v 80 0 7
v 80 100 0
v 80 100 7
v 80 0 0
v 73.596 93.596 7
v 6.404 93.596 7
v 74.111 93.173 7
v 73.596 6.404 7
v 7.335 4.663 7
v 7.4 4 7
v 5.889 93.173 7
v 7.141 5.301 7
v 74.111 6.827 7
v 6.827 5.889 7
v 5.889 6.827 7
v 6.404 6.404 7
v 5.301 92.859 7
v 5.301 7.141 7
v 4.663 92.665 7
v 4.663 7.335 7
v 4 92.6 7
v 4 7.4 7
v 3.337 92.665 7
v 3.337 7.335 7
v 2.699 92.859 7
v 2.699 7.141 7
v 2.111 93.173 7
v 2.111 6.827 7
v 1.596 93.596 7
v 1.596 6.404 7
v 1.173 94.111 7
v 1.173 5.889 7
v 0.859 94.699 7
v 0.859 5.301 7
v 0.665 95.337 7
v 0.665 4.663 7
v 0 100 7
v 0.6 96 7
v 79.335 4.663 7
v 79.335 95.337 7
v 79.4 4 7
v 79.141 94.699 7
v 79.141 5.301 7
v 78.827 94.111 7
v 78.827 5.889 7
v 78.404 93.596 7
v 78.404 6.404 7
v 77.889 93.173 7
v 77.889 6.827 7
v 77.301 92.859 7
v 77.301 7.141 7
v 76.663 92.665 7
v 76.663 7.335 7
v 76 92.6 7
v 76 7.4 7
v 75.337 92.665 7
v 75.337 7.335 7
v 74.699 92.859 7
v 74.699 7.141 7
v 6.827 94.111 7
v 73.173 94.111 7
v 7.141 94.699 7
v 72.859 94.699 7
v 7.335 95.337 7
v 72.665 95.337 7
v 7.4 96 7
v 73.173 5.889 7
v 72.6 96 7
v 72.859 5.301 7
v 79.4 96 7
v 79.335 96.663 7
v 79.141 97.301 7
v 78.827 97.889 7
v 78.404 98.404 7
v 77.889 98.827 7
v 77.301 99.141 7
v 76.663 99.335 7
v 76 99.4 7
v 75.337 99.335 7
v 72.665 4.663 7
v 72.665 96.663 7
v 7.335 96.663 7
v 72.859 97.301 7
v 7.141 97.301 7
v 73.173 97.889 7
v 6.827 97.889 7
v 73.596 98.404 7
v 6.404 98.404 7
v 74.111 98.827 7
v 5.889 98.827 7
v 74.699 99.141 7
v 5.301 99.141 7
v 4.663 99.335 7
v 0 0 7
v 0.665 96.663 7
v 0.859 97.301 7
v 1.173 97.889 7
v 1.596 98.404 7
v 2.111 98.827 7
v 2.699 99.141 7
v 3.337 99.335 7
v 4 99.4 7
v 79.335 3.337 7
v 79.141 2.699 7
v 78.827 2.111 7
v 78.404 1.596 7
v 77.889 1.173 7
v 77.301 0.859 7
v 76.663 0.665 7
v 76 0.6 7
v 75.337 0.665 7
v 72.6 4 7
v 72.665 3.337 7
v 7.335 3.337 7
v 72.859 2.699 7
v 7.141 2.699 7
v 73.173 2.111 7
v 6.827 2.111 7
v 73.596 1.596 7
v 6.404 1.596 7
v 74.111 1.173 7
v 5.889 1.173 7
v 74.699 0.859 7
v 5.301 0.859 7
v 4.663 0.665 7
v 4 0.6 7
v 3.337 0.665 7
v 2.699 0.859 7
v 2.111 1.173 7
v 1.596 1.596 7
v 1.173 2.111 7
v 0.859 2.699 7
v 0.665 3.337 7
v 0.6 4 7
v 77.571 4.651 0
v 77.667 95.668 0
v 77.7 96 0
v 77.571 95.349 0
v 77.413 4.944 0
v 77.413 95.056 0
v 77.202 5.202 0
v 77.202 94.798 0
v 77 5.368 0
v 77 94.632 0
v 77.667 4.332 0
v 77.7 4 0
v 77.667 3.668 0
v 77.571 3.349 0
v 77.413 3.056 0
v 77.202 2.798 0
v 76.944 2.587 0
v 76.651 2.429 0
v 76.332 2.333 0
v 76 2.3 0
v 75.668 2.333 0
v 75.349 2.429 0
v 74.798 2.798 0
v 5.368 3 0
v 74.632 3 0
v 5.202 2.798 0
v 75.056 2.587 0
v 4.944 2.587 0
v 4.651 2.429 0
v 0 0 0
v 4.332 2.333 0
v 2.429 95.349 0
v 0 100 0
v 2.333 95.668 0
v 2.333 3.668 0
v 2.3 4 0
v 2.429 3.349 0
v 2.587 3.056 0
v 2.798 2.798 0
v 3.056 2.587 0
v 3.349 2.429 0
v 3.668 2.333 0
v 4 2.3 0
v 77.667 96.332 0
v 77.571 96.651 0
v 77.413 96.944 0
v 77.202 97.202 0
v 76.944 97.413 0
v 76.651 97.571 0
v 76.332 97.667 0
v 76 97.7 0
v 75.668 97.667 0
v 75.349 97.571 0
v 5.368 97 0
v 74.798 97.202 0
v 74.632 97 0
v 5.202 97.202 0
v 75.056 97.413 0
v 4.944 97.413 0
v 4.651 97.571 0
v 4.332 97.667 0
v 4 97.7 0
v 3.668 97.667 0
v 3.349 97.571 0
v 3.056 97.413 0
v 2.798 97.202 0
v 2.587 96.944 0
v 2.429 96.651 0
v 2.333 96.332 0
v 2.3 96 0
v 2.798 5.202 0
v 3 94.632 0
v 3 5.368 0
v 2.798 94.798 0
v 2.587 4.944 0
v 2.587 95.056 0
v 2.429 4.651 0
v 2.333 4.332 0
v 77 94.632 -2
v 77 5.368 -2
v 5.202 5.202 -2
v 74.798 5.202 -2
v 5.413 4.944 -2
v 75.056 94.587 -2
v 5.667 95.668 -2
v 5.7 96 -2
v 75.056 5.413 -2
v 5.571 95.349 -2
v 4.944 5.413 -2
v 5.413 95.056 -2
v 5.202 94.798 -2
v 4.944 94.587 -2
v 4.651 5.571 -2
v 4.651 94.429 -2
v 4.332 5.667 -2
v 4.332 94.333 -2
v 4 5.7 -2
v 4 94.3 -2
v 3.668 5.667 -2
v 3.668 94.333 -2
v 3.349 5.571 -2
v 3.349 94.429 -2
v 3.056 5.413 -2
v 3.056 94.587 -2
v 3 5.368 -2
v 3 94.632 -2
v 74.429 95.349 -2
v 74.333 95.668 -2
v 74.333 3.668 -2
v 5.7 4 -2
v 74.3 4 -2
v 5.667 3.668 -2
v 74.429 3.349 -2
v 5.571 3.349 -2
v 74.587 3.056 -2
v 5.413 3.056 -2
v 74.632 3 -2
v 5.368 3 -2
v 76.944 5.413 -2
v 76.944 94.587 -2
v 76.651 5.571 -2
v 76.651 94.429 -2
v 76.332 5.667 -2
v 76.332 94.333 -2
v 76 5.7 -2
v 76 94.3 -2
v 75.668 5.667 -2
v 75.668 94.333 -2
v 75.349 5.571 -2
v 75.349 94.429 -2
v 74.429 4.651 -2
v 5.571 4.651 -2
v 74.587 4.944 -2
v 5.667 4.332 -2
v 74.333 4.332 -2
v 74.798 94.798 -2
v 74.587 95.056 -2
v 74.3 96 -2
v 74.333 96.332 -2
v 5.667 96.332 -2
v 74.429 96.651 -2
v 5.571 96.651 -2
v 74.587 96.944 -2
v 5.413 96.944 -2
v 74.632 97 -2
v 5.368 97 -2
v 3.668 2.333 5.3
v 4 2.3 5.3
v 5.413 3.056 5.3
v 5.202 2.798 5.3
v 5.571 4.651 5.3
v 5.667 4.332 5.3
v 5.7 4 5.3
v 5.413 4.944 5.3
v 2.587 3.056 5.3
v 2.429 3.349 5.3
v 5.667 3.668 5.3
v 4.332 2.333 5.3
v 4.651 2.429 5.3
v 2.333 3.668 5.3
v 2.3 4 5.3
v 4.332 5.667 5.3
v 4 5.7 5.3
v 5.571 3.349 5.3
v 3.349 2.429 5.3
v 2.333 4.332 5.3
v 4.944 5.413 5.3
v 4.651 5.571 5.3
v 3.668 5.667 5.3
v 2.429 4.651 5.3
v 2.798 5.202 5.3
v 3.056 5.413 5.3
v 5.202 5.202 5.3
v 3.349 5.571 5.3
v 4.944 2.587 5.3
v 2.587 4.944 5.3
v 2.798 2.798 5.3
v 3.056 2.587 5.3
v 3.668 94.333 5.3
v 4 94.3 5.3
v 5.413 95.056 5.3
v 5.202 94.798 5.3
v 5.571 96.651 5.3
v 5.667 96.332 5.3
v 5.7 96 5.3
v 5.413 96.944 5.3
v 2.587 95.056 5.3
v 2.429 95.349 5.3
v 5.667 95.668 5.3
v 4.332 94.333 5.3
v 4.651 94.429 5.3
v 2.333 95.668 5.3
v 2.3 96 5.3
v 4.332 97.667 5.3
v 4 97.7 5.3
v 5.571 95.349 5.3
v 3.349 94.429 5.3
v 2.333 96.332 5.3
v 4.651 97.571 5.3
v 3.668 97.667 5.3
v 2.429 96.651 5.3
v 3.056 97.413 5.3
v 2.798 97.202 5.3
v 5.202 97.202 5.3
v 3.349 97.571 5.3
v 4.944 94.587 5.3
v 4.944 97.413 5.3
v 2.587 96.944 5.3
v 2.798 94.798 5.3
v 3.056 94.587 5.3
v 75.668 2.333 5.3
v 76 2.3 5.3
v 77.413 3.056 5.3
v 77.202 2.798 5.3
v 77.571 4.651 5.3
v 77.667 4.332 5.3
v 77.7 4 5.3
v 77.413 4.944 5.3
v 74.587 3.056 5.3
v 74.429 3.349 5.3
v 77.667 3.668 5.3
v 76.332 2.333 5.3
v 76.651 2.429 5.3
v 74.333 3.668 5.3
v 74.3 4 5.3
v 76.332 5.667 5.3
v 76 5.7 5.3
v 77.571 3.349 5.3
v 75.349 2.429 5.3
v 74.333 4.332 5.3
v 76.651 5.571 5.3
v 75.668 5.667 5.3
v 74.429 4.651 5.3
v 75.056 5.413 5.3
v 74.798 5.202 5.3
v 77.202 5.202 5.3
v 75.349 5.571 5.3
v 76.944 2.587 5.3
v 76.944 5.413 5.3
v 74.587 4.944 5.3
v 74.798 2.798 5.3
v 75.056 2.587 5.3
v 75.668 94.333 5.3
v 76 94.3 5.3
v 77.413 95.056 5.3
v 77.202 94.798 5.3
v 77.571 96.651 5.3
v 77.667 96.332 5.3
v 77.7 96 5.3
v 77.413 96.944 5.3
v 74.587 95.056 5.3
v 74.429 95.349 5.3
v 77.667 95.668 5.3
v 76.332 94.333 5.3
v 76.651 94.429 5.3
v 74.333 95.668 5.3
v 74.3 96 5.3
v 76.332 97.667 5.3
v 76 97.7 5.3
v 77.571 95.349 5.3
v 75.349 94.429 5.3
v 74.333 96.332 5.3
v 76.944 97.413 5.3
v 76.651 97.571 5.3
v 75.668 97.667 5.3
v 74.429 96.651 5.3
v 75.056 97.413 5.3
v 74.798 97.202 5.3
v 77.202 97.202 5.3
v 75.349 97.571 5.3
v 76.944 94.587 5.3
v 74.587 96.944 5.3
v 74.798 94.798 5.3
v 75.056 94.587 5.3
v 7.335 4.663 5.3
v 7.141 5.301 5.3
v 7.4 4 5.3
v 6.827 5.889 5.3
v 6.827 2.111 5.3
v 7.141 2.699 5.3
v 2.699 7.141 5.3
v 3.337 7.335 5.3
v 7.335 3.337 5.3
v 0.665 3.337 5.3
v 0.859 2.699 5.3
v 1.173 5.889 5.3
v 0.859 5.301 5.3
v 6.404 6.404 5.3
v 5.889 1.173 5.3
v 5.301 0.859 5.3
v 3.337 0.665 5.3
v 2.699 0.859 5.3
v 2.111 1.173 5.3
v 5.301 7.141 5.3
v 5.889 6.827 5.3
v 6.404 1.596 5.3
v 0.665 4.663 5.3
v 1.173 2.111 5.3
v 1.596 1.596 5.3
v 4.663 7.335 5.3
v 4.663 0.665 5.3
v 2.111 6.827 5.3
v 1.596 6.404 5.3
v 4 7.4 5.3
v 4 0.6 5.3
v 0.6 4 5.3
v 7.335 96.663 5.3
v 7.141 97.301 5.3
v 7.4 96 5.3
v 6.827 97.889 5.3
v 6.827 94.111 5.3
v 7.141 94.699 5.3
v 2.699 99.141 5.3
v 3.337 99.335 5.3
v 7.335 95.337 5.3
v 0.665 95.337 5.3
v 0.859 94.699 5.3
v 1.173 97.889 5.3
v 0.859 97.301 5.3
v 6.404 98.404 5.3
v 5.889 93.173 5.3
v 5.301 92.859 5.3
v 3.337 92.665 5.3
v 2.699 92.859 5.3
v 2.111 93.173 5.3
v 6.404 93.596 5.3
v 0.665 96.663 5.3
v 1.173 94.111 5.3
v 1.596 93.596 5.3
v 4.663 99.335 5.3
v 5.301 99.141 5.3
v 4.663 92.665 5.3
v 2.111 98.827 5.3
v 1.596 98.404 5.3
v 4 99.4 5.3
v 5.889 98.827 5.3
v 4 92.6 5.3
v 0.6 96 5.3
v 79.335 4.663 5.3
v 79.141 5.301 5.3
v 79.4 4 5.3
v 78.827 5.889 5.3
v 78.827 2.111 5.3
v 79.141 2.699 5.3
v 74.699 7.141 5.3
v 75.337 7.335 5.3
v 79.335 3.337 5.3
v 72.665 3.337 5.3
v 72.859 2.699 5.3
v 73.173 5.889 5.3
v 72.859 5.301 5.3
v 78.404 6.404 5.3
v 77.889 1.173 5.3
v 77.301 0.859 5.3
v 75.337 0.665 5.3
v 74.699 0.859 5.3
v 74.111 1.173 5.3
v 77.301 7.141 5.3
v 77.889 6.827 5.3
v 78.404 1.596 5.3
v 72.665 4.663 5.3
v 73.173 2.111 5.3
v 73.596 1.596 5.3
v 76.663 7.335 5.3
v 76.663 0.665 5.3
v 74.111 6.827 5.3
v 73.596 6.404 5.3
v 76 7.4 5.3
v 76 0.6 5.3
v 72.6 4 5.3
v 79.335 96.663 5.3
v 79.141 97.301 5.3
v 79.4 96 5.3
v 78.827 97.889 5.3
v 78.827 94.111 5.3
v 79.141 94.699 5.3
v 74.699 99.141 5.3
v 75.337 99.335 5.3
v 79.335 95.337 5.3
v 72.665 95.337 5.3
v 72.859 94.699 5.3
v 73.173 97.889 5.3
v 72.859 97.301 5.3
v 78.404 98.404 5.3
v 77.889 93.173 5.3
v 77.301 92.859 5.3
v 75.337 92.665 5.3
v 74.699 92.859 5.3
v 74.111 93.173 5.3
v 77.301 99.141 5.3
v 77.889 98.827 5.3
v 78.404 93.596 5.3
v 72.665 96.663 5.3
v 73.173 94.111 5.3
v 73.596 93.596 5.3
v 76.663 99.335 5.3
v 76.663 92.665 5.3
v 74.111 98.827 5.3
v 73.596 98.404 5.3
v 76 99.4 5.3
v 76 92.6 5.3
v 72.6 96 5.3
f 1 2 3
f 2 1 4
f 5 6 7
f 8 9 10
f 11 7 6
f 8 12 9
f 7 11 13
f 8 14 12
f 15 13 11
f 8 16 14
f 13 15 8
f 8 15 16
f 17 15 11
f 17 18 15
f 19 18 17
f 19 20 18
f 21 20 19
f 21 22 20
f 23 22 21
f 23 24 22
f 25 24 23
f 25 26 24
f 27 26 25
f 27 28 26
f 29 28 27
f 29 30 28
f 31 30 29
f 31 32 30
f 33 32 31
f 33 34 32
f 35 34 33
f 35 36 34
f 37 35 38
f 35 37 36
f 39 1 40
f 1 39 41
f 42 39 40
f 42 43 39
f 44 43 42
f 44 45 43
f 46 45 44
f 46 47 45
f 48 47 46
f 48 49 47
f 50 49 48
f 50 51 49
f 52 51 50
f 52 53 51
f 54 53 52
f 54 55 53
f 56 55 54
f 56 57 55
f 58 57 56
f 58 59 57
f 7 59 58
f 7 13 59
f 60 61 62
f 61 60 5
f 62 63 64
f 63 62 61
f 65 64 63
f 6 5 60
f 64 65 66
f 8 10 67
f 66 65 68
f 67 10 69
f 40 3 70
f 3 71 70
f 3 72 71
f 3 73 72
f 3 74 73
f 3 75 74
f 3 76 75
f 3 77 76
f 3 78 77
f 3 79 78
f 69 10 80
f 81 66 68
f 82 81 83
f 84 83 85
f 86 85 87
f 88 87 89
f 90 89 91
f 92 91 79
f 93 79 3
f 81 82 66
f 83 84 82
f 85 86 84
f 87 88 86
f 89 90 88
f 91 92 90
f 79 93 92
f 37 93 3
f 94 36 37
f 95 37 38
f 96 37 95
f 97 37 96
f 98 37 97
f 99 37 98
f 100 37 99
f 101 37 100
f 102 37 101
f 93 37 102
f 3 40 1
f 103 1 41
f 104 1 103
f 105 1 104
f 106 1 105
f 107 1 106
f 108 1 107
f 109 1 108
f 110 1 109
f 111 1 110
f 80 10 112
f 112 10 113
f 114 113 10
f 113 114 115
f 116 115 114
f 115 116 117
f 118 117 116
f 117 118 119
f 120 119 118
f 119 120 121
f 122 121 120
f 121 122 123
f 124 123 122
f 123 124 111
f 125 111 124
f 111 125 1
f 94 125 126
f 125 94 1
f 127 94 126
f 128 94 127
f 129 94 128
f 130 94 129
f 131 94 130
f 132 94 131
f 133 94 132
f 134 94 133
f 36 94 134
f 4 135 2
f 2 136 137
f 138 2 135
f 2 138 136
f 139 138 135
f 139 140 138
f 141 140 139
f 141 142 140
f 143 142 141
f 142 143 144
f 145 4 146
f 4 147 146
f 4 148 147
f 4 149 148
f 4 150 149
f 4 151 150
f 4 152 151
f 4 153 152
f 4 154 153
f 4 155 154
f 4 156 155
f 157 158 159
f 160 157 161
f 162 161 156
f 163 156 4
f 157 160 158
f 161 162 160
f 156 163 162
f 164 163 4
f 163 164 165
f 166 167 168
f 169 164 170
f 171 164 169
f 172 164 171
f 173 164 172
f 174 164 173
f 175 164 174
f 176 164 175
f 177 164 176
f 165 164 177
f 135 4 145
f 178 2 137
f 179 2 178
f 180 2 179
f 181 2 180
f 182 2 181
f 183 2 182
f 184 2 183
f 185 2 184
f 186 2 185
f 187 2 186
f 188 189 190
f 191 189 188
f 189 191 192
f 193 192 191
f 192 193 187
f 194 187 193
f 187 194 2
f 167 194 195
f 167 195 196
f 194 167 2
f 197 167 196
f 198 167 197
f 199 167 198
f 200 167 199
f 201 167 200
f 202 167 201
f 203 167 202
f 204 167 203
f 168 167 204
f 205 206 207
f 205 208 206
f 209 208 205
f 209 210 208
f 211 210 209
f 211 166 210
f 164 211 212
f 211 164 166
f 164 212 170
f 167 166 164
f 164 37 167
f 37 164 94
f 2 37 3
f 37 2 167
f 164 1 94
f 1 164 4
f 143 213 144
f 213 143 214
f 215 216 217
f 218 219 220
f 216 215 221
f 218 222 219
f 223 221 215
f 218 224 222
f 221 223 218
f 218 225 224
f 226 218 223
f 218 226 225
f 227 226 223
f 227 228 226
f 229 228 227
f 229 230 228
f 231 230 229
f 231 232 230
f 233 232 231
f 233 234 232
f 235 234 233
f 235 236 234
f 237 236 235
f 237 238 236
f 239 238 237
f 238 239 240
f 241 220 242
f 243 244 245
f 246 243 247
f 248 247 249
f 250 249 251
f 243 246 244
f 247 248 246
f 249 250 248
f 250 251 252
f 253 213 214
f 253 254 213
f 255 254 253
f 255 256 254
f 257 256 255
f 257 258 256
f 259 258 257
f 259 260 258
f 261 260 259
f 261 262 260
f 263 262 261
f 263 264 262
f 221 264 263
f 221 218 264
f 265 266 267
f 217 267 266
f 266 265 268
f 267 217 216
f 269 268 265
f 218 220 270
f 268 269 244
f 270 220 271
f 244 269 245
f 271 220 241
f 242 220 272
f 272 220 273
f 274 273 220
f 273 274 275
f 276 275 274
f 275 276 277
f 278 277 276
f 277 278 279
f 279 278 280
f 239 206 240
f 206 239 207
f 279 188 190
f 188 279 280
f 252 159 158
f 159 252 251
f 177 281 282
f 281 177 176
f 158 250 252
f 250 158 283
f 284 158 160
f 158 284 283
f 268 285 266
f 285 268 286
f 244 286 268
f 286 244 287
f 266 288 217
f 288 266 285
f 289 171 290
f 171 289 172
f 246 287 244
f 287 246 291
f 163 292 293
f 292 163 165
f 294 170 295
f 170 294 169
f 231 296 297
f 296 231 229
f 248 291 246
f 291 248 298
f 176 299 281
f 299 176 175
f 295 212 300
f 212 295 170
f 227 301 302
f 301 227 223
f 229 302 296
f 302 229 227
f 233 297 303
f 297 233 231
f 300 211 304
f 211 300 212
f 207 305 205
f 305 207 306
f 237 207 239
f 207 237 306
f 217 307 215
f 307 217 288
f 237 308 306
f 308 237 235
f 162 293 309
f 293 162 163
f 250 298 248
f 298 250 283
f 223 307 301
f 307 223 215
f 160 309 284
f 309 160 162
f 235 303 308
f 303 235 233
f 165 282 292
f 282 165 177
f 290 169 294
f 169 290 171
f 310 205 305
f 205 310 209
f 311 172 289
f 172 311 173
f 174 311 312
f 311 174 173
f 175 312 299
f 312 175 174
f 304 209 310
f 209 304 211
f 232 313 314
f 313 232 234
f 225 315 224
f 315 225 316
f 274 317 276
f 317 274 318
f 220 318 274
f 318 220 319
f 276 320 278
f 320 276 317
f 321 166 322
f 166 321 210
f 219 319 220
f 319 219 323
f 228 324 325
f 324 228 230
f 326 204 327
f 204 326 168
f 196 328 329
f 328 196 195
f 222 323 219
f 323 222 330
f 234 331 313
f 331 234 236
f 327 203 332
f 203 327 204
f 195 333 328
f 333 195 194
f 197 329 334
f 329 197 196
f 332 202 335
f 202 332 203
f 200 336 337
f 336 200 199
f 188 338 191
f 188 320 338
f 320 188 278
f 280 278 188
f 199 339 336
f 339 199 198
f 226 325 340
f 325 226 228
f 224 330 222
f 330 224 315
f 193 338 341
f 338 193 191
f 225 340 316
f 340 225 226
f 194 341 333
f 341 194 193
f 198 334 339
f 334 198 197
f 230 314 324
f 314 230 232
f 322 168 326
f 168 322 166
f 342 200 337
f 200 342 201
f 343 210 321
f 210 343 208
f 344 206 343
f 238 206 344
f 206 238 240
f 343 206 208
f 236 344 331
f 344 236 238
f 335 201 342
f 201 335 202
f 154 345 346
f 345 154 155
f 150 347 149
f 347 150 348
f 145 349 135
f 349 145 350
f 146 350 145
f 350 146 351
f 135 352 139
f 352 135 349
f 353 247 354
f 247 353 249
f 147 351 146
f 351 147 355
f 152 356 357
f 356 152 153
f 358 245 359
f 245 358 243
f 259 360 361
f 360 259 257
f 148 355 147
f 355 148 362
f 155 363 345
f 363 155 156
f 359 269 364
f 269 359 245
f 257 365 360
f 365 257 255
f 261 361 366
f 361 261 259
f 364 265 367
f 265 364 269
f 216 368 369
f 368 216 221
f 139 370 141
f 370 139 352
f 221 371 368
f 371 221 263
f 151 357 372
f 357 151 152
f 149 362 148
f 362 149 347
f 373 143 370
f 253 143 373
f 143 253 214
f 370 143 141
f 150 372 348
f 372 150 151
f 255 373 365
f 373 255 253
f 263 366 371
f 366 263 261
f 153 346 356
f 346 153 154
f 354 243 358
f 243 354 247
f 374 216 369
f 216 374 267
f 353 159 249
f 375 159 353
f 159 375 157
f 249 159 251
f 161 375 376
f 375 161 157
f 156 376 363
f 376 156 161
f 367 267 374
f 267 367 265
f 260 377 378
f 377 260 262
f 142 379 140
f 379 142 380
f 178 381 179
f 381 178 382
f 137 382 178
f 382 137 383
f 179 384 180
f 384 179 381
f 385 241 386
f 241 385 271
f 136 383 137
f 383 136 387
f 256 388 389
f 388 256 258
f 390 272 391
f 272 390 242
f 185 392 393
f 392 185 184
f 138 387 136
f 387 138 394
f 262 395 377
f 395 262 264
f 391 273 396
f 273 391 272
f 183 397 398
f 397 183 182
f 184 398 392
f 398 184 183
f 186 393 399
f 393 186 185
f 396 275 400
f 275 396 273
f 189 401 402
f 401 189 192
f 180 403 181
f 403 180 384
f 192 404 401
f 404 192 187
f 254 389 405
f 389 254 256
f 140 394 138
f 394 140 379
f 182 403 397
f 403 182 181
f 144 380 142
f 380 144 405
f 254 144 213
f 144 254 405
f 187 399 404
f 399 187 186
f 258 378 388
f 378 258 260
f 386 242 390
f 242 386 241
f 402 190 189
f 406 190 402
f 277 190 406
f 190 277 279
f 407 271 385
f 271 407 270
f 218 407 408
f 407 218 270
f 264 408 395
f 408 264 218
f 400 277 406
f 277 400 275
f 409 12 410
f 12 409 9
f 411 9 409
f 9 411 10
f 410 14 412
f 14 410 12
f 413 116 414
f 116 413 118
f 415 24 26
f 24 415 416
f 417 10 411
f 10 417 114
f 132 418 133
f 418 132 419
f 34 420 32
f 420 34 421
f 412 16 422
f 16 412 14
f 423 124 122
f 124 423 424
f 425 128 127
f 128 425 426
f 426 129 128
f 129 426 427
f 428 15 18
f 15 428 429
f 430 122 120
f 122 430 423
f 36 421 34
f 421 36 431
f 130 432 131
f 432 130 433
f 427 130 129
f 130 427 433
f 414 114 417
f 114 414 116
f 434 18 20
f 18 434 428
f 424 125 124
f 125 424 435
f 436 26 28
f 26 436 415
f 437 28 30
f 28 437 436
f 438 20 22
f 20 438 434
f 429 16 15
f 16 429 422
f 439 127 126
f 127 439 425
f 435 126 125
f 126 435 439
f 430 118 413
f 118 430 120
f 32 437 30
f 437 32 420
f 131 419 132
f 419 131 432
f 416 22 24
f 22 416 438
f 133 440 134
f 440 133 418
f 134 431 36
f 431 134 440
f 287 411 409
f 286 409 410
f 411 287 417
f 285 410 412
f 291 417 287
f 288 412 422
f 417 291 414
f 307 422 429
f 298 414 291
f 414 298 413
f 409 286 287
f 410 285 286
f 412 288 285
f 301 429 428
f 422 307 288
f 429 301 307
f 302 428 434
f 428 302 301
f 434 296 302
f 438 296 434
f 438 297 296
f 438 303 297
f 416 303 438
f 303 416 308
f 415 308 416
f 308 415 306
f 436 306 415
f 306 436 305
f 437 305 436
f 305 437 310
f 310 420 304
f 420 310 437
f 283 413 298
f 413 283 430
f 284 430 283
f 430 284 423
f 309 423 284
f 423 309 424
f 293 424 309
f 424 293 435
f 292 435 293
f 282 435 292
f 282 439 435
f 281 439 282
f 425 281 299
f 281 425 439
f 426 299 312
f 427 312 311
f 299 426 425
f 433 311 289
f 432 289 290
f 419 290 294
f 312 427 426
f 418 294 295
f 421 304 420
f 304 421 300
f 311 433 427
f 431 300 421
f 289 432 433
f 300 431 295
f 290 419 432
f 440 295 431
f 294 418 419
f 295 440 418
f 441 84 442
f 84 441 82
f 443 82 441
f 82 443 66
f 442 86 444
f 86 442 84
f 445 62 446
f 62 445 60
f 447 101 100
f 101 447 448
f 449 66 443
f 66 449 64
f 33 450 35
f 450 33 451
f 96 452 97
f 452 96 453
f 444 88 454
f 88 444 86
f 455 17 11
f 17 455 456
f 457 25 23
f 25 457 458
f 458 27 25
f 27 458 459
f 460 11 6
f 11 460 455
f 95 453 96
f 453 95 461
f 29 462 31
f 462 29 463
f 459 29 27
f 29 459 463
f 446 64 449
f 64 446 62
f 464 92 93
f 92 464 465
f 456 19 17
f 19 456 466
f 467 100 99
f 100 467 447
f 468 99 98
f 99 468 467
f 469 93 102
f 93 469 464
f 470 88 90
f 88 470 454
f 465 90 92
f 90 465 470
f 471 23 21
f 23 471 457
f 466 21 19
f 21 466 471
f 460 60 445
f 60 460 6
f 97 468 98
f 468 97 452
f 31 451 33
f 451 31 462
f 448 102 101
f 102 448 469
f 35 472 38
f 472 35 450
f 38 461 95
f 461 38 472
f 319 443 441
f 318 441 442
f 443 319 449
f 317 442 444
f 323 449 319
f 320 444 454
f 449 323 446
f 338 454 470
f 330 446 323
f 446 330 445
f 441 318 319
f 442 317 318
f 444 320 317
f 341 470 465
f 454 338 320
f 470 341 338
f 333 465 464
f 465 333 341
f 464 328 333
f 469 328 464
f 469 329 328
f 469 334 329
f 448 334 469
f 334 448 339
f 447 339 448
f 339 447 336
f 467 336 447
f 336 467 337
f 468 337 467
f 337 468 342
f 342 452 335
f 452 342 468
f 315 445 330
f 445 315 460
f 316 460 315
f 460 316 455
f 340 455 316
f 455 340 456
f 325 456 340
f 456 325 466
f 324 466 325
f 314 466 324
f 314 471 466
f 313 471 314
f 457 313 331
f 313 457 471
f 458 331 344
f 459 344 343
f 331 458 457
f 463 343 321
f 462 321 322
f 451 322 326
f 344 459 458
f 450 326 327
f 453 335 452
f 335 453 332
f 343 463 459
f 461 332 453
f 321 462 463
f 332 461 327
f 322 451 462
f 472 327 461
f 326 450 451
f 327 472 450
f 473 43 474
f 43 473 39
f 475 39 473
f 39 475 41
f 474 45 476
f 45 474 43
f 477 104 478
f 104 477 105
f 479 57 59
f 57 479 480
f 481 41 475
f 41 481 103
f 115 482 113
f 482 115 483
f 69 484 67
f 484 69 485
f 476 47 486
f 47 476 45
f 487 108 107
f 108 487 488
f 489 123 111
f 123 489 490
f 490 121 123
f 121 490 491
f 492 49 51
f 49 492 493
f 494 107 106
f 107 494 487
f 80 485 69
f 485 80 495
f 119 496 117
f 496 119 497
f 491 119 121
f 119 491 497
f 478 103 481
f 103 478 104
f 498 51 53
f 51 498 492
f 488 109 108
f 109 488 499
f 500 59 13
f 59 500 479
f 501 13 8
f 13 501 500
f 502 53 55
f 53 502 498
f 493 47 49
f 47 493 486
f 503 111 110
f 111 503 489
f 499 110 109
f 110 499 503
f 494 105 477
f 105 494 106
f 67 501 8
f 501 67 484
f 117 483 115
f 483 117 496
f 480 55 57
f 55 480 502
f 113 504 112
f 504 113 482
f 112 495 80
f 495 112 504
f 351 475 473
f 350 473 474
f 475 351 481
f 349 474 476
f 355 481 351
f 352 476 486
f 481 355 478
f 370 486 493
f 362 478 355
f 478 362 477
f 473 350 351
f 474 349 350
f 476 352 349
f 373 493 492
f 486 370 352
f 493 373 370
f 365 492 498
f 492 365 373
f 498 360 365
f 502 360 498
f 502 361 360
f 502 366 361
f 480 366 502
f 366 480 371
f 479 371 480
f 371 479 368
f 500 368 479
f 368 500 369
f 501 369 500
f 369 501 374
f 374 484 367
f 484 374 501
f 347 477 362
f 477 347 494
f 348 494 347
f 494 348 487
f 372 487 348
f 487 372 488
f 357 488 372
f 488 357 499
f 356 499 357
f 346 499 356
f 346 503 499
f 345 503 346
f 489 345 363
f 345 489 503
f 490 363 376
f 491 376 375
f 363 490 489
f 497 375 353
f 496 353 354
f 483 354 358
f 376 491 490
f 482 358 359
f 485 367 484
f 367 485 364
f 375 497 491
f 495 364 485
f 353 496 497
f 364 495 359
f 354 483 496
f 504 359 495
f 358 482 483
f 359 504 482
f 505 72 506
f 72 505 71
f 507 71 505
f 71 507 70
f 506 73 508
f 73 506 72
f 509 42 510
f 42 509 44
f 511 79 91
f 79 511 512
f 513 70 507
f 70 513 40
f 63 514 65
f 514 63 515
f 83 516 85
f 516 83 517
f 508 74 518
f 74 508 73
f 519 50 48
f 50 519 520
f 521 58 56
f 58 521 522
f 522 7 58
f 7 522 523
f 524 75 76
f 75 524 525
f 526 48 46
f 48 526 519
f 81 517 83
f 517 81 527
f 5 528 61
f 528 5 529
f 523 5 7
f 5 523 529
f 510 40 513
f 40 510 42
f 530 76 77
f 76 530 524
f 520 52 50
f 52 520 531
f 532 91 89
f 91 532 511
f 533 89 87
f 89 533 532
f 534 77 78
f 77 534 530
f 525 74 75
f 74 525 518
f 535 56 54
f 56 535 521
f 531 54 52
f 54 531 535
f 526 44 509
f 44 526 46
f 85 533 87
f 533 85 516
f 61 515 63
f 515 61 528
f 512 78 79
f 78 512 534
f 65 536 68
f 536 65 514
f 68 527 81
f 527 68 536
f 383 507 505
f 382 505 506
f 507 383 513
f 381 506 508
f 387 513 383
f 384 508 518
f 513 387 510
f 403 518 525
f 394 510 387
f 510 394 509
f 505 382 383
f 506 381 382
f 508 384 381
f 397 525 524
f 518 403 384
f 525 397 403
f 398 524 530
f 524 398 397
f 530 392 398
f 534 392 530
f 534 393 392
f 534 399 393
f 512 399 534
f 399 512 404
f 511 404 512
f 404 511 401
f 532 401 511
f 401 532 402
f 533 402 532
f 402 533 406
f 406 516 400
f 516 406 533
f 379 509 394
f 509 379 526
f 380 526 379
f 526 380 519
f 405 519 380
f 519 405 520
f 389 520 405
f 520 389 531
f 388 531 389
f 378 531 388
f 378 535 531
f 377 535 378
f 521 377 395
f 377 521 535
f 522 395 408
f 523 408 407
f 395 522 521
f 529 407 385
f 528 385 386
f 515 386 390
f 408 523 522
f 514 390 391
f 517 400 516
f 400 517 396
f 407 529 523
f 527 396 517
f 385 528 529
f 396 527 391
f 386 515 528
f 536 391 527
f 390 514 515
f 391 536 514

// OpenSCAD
$fn = 32;

// ----------------------------------------------------------------------
// Enclosure lid: 80 x 100 x 7 mm, 4 bolt holes
// ----------------------------------------------------------------------

// --- parameters (mm) ---
length = 80;              // lid length, X
width = 100;              // lid width, Y
plate_t = 7;              // lid plate thickness
bolt_d = 3.4;             // bolt clearance
boss_lip = 4;             // bolt hole inset from the corner
sink = 1;                 // overlap of the lip and ribs into the plate
lip_h = 3;                // lip height below the plate
lip_wall = 3;             // lip wall thickness
cs_d = 6.8;               // countersink diameter
cs_h = 1.7;               // countersink depth

module plate() {
  cube([length, width, plate_t]);
  /* lip that drops into the housing opening, sunk into the plate */
  translate([lip_wall, lip_wall, -lip_h + sink]) cube([length - 2 * lip_wall, width - 2 * lip_wall, lip_h]);
}

difference() {
  plate();
  /* bolt pattern matching the corner bosses */
  for (sx = [0, 1]) for (sy = [0, 1])
    translate([sx * (length - 2 * boss_lip) + boss_lip, sy * (width - 2 * boss_lip) + boss_lip, -lip_h - 1])
      cylinder(h = plate_t + lip_h + 2, d = bolt_d);
  /* countersinks so the heads sit flush */
  for (sx = [0, 1]) for (sy = [0, 1])
    translate([sx * (length - 2 * boss_lip) + boss_lip, sy * (width - 2 * boss_lip) + boss_lip, plate_t - cs_h])
      cylinder(h = cs_h + 0.5, d = cs_d);
}
